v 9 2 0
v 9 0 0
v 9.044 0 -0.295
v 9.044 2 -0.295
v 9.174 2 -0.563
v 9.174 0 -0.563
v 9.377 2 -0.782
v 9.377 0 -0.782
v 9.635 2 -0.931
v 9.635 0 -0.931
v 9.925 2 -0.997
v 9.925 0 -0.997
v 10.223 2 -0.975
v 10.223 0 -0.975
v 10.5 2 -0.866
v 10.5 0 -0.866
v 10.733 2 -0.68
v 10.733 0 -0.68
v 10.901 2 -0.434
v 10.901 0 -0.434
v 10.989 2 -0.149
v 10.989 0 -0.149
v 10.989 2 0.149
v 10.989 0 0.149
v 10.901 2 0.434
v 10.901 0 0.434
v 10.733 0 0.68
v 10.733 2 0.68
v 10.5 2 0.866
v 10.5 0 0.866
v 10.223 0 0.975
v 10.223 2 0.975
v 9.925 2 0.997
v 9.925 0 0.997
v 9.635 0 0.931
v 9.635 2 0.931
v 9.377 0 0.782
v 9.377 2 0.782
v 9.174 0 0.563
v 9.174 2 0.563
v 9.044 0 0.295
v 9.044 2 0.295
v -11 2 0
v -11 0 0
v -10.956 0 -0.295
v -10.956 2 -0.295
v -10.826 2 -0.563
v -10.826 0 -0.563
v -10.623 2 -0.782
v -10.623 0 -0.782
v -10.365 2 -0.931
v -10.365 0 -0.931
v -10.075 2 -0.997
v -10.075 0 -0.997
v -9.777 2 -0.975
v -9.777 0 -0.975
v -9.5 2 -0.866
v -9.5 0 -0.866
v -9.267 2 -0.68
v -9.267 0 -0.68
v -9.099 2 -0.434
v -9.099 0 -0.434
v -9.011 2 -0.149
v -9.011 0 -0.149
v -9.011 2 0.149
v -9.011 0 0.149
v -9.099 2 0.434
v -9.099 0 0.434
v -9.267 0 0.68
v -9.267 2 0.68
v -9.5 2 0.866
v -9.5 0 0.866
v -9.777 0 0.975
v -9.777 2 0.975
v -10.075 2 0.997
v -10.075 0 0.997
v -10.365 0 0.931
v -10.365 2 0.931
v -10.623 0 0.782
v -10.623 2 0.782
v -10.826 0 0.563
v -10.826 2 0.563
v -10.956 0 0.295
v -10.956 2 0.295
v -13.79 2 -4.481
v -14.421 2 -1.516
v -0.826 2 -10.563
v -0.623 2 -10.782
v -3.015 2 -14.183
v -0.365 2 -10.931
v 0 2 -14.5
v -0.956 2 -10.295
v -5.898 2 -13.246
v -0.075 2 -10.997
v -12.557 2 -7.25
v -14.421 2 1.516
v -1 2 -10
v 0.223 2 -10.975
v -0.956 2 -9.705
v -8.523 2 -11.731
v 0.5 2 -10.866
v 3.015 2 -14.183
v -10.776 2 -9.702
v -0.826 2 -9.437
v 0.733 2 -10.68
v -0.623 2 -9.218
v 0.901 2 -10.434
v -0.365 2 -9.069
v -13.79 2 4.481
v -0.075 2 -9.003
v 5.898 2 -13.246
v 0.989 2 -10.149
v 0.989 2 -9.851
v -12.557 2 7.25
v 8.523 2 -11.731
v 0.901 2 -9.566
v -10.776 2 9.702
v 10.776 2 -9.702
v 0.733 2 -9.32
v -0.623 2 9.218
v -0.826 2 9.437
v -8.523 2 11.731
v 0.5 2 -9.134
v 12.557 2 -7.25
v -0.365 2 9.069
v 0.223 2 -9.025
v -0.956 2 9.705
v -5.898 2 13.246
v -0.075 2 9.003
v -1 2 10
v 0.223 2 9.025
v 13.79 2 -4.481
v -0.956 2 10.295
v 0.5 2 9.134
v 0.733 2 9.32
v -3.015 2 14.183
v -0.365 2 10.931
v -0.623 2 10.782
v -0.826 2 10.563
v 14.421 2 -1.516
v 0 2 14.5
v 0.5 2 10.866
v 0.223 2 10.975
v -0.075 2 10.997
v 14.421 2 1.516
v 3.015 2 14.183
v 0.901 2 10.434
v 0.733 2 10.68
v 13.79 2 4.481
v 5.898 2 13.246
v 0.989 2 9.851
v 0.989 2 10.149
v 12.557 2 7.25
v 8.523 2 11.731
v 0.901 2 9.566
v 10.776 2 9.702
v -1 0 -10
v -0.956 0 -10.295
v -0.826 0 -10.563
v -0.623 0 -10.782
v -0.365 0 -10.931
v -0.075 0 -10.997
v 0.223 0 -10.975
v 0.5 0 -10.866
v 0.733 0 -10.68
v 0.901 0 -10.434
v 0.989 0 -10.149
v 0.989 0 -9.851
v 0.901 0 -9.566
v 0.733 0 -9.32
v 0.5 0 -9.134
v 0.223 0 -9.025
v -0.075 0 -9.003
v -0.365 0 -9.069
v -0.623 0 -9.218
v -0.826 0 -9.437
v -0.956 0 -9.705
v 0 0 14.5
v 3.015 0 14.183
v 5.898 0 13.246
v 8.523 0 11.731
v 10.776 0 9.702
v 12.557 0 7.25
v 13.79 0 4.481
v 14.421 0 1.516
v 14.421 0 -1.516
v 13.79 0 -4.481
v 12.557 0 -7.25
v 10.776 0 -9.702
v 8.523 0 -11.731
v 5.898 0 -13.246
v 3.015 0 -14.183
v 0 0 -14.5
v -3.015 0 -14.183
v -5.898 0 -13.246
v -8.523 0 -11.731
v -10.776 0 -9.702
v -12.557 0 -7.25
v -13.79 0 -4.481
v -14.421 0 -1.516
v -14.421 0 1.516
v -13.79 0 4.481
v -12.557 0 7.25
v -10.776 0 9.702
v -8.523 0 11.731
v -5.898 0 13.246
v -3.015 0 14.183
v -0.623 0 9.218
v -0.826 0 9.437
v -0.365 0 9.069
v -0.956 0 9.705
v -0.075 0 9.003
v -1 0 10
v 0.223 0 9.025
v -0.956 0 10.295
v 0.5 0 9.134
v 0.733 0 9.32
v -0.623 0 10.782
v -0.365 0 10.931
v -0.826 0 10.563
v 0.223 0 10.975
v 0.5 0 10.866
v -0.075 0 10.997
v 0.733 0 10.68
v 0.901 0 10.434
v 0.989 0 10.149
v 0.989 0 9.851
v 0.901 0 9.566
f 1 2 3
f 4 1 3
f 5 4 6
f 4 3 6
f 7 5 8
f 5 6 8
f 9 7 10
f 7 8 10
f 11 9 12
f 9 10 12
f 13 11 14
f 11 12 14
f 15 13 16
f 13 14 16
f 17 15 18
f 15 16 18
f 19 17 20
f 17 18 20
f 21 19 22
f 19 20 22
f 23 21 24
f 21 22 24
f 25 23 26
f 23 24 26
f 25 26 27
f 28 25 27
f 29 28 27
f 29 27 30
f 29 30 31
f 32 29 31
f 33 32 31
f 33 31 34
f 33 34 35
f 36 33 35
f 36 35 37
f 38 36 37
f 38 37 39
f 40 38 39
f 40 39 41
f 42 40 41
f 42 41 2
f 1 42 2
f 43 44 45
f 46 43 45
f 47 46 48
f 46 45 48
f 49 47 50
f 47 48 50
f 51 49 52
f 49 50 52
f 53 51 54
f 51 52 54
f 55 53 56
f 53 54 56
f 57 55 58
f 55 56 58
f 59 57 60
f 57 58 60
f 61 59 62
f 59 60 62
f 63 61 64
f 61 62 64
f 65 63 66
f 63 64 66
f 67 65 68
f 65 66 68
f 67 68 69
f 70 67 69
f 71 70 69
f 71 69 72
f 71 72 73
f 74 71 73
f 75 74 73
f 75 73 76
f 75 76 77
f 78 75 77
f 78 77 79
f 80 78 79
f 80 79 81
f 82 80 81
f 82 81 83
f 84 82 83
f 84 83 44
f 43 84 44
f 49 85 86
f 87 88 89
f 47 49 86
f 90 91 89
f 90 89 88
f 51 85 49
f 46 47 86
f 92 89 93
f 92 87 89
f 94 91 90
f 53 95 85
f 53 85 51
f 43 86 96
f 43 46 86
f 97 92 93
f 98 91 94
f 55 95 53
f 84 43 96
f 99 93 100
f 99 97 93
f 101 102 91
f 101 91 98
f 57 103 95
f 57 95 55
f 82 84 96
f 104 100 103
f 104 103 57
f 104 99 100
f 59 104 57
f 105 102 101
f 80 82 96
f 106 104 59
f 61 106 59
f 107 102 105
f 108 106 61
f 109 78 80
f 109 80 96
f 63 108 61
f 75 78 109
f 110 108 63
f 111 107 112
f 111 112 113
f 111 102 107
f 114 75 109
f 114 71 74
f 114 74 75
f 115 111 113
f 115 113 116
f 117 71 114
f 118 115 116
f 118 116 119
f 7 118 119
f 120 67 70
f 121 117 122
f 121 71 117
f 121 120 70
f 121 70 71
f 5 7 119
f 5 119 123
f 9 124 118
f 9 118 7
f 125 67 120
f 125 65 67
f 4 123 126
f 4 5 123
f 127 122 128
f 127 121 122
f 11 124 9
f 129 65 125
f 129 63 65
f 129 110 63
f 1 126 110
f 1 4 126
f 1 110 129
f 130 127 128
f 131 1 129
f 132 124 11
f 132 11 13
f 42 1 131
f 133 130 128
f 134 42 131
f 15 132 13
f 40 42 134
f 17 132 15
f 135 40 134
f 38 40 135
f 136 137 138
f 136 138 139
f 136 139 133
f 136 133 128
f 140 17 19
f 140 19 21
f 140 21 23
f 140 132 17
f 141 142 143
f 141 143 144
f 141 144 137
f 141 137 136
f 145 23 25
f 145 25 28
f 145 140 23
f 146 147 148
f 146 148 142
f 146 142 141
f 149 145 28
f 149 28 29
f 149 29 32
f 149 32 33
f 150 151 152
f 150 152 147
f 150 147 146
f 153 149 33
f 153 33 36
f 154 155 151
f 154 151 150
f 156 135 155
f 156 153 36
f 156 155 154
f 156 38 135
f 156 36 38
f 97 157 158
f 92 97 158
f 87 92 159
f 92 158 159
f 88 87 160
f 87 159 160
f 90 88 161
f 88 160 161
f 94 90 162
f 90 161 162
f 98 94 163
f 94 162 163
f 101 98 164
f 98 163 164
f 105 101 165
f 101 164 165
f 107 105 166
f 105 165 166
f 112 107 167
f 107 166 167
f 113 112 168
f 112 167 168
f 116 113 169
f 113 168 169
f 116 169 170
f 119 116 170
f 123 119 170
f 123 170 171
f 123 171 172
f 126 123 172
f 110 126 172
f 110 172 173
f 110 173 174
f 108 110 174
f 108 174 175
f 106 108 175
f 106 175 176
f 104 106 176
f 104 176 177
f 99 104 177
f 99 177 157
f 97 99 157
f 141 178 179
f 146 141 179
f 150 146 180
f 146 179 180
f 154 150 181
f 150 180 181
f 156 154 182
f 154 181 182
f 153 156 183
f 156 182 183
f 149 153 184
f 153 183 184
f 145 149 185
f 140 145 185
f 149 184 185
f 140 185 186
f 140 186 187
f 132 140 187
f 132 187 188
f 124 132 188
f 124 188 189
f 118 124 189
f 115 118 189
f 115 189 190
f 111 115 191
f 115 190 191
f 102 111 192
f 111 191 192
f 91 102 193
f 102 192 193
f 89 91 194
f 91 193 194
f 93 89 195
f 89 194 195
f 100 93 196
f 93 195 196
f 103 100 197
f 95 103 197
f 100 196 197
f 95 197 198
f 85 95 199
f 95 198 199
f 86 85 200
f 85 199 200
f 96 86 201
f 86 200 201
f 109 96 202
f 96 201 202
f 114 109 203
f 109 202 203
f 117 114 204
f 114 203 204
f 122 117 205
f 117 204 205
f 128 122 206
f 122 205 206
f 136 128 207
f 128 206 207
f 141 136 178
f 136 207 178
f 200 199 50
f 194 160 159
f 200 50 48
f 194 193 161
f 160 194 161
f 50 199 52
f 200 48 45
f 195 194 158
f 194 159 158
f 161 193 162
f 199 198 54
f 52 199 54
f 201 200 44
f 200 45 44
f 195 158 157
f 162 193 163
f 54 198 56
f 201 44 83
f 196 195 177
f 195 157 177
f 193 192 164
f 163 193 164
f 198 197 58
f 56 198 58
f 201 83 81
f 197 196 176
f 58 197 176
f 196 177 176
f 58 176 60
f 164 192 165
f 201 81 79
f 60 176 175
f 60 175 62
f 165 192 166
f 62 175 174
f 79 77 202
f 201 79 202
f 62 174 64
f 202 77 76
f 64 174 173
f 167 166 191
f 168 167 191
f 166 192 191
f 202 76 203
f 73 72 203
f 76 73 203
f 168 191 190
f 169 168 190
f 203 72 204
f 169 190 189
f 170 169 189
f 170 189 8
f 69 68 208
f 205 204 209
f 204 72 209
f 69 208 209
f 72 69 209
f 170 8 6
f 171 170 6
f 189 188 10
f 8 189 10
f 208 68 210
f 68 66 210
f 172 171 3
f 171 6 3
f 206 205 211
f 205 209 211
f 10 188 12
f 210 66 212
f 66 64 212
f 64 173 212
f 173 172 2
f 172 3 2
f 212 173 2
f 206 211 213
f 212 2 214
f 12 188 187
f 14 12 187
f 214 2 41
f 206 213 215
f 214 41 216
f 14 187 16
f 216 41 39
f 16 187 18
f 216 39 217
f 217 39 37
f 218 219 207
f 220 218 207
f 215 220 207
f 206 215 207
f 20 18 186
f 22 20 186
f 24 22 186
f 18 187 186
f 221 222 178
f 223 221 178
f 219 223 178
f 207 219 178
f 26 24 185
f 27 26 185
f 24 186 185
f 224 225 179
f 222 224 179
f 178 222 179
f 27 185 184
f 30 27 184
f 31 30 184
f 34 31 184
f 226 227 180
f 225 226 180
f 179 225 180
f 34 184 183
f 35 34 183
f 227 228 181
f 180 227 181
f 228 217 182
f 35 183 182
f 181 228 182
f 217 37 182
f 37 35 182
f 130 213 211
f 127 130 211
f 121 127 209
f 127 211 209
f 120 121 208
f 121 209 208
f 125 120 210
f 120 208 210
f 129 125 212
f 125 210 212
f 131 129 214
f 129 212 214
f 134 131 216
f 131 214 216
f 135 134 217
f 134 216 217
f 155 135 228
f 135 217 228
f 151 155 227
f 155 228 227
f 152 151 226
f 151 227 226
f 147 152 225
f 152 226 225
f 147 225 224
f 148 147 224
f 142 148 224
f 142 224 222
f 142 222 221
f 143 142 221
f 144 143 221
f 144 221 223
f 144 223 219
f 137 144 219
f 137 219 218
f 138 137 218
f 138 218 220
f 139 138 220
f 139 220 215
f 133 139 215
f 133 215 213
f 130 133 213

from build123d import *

# Parameters (mm, degrees)
SKETCH1_R                 = 14.5
BOSS_EXTRUDE1_DEPTH       = 2
F_2_0MM_DOWEL_HOLE1_D     = 2
F_2_0MM_DOWEL_HOLE1_DEPTH = 42.93
F_2_0MM_DOWEL_HOLE1_TIP   = 0.600860619


with BuildPart() as part:
    # Sketch1 → Boss-Extrude1 (new body)
    with BuildSketch(Plane(origin=(0, 0, 0), x_dir=(1, 0, 0), z_dir=(0, 1, 0))):
        with Locations(Location((0, 0, 0), (0, 0, 270))):
            Circle(SKETCH1_R)
    extrude(amount=BOSS_EXTRUDE1_DEPTH)

    # Ø2.0mm Dowel Hole1
    with Locations(Plane(origin=(0, 2, 0), x_dir=(1, 0, 0), z_dir=(0, 1, 0))):
        with Locations((-10, 0), (0, 10), (10, 0), (0, -10)):
            Hole(F_2_0MM_DOWEL_HOLE1_D / 2, depth=F_2_0MM_DOWEL_HOLE1_DEPTH)
            with Locations((0, 0, -(F_2_0MM_DOWEL_HOLE1_DEPTH + F_2_0MM_DOWEL_HOLE1_TIP / 2))):  # 118° drill point
                Cone(0, F_2_0MM_DOWEL_HOLE1_D / 2, F_2_0MM_DOWEL_HOLE1_TIP, mode=Mode.SUBTRACT)


solid = part.part
